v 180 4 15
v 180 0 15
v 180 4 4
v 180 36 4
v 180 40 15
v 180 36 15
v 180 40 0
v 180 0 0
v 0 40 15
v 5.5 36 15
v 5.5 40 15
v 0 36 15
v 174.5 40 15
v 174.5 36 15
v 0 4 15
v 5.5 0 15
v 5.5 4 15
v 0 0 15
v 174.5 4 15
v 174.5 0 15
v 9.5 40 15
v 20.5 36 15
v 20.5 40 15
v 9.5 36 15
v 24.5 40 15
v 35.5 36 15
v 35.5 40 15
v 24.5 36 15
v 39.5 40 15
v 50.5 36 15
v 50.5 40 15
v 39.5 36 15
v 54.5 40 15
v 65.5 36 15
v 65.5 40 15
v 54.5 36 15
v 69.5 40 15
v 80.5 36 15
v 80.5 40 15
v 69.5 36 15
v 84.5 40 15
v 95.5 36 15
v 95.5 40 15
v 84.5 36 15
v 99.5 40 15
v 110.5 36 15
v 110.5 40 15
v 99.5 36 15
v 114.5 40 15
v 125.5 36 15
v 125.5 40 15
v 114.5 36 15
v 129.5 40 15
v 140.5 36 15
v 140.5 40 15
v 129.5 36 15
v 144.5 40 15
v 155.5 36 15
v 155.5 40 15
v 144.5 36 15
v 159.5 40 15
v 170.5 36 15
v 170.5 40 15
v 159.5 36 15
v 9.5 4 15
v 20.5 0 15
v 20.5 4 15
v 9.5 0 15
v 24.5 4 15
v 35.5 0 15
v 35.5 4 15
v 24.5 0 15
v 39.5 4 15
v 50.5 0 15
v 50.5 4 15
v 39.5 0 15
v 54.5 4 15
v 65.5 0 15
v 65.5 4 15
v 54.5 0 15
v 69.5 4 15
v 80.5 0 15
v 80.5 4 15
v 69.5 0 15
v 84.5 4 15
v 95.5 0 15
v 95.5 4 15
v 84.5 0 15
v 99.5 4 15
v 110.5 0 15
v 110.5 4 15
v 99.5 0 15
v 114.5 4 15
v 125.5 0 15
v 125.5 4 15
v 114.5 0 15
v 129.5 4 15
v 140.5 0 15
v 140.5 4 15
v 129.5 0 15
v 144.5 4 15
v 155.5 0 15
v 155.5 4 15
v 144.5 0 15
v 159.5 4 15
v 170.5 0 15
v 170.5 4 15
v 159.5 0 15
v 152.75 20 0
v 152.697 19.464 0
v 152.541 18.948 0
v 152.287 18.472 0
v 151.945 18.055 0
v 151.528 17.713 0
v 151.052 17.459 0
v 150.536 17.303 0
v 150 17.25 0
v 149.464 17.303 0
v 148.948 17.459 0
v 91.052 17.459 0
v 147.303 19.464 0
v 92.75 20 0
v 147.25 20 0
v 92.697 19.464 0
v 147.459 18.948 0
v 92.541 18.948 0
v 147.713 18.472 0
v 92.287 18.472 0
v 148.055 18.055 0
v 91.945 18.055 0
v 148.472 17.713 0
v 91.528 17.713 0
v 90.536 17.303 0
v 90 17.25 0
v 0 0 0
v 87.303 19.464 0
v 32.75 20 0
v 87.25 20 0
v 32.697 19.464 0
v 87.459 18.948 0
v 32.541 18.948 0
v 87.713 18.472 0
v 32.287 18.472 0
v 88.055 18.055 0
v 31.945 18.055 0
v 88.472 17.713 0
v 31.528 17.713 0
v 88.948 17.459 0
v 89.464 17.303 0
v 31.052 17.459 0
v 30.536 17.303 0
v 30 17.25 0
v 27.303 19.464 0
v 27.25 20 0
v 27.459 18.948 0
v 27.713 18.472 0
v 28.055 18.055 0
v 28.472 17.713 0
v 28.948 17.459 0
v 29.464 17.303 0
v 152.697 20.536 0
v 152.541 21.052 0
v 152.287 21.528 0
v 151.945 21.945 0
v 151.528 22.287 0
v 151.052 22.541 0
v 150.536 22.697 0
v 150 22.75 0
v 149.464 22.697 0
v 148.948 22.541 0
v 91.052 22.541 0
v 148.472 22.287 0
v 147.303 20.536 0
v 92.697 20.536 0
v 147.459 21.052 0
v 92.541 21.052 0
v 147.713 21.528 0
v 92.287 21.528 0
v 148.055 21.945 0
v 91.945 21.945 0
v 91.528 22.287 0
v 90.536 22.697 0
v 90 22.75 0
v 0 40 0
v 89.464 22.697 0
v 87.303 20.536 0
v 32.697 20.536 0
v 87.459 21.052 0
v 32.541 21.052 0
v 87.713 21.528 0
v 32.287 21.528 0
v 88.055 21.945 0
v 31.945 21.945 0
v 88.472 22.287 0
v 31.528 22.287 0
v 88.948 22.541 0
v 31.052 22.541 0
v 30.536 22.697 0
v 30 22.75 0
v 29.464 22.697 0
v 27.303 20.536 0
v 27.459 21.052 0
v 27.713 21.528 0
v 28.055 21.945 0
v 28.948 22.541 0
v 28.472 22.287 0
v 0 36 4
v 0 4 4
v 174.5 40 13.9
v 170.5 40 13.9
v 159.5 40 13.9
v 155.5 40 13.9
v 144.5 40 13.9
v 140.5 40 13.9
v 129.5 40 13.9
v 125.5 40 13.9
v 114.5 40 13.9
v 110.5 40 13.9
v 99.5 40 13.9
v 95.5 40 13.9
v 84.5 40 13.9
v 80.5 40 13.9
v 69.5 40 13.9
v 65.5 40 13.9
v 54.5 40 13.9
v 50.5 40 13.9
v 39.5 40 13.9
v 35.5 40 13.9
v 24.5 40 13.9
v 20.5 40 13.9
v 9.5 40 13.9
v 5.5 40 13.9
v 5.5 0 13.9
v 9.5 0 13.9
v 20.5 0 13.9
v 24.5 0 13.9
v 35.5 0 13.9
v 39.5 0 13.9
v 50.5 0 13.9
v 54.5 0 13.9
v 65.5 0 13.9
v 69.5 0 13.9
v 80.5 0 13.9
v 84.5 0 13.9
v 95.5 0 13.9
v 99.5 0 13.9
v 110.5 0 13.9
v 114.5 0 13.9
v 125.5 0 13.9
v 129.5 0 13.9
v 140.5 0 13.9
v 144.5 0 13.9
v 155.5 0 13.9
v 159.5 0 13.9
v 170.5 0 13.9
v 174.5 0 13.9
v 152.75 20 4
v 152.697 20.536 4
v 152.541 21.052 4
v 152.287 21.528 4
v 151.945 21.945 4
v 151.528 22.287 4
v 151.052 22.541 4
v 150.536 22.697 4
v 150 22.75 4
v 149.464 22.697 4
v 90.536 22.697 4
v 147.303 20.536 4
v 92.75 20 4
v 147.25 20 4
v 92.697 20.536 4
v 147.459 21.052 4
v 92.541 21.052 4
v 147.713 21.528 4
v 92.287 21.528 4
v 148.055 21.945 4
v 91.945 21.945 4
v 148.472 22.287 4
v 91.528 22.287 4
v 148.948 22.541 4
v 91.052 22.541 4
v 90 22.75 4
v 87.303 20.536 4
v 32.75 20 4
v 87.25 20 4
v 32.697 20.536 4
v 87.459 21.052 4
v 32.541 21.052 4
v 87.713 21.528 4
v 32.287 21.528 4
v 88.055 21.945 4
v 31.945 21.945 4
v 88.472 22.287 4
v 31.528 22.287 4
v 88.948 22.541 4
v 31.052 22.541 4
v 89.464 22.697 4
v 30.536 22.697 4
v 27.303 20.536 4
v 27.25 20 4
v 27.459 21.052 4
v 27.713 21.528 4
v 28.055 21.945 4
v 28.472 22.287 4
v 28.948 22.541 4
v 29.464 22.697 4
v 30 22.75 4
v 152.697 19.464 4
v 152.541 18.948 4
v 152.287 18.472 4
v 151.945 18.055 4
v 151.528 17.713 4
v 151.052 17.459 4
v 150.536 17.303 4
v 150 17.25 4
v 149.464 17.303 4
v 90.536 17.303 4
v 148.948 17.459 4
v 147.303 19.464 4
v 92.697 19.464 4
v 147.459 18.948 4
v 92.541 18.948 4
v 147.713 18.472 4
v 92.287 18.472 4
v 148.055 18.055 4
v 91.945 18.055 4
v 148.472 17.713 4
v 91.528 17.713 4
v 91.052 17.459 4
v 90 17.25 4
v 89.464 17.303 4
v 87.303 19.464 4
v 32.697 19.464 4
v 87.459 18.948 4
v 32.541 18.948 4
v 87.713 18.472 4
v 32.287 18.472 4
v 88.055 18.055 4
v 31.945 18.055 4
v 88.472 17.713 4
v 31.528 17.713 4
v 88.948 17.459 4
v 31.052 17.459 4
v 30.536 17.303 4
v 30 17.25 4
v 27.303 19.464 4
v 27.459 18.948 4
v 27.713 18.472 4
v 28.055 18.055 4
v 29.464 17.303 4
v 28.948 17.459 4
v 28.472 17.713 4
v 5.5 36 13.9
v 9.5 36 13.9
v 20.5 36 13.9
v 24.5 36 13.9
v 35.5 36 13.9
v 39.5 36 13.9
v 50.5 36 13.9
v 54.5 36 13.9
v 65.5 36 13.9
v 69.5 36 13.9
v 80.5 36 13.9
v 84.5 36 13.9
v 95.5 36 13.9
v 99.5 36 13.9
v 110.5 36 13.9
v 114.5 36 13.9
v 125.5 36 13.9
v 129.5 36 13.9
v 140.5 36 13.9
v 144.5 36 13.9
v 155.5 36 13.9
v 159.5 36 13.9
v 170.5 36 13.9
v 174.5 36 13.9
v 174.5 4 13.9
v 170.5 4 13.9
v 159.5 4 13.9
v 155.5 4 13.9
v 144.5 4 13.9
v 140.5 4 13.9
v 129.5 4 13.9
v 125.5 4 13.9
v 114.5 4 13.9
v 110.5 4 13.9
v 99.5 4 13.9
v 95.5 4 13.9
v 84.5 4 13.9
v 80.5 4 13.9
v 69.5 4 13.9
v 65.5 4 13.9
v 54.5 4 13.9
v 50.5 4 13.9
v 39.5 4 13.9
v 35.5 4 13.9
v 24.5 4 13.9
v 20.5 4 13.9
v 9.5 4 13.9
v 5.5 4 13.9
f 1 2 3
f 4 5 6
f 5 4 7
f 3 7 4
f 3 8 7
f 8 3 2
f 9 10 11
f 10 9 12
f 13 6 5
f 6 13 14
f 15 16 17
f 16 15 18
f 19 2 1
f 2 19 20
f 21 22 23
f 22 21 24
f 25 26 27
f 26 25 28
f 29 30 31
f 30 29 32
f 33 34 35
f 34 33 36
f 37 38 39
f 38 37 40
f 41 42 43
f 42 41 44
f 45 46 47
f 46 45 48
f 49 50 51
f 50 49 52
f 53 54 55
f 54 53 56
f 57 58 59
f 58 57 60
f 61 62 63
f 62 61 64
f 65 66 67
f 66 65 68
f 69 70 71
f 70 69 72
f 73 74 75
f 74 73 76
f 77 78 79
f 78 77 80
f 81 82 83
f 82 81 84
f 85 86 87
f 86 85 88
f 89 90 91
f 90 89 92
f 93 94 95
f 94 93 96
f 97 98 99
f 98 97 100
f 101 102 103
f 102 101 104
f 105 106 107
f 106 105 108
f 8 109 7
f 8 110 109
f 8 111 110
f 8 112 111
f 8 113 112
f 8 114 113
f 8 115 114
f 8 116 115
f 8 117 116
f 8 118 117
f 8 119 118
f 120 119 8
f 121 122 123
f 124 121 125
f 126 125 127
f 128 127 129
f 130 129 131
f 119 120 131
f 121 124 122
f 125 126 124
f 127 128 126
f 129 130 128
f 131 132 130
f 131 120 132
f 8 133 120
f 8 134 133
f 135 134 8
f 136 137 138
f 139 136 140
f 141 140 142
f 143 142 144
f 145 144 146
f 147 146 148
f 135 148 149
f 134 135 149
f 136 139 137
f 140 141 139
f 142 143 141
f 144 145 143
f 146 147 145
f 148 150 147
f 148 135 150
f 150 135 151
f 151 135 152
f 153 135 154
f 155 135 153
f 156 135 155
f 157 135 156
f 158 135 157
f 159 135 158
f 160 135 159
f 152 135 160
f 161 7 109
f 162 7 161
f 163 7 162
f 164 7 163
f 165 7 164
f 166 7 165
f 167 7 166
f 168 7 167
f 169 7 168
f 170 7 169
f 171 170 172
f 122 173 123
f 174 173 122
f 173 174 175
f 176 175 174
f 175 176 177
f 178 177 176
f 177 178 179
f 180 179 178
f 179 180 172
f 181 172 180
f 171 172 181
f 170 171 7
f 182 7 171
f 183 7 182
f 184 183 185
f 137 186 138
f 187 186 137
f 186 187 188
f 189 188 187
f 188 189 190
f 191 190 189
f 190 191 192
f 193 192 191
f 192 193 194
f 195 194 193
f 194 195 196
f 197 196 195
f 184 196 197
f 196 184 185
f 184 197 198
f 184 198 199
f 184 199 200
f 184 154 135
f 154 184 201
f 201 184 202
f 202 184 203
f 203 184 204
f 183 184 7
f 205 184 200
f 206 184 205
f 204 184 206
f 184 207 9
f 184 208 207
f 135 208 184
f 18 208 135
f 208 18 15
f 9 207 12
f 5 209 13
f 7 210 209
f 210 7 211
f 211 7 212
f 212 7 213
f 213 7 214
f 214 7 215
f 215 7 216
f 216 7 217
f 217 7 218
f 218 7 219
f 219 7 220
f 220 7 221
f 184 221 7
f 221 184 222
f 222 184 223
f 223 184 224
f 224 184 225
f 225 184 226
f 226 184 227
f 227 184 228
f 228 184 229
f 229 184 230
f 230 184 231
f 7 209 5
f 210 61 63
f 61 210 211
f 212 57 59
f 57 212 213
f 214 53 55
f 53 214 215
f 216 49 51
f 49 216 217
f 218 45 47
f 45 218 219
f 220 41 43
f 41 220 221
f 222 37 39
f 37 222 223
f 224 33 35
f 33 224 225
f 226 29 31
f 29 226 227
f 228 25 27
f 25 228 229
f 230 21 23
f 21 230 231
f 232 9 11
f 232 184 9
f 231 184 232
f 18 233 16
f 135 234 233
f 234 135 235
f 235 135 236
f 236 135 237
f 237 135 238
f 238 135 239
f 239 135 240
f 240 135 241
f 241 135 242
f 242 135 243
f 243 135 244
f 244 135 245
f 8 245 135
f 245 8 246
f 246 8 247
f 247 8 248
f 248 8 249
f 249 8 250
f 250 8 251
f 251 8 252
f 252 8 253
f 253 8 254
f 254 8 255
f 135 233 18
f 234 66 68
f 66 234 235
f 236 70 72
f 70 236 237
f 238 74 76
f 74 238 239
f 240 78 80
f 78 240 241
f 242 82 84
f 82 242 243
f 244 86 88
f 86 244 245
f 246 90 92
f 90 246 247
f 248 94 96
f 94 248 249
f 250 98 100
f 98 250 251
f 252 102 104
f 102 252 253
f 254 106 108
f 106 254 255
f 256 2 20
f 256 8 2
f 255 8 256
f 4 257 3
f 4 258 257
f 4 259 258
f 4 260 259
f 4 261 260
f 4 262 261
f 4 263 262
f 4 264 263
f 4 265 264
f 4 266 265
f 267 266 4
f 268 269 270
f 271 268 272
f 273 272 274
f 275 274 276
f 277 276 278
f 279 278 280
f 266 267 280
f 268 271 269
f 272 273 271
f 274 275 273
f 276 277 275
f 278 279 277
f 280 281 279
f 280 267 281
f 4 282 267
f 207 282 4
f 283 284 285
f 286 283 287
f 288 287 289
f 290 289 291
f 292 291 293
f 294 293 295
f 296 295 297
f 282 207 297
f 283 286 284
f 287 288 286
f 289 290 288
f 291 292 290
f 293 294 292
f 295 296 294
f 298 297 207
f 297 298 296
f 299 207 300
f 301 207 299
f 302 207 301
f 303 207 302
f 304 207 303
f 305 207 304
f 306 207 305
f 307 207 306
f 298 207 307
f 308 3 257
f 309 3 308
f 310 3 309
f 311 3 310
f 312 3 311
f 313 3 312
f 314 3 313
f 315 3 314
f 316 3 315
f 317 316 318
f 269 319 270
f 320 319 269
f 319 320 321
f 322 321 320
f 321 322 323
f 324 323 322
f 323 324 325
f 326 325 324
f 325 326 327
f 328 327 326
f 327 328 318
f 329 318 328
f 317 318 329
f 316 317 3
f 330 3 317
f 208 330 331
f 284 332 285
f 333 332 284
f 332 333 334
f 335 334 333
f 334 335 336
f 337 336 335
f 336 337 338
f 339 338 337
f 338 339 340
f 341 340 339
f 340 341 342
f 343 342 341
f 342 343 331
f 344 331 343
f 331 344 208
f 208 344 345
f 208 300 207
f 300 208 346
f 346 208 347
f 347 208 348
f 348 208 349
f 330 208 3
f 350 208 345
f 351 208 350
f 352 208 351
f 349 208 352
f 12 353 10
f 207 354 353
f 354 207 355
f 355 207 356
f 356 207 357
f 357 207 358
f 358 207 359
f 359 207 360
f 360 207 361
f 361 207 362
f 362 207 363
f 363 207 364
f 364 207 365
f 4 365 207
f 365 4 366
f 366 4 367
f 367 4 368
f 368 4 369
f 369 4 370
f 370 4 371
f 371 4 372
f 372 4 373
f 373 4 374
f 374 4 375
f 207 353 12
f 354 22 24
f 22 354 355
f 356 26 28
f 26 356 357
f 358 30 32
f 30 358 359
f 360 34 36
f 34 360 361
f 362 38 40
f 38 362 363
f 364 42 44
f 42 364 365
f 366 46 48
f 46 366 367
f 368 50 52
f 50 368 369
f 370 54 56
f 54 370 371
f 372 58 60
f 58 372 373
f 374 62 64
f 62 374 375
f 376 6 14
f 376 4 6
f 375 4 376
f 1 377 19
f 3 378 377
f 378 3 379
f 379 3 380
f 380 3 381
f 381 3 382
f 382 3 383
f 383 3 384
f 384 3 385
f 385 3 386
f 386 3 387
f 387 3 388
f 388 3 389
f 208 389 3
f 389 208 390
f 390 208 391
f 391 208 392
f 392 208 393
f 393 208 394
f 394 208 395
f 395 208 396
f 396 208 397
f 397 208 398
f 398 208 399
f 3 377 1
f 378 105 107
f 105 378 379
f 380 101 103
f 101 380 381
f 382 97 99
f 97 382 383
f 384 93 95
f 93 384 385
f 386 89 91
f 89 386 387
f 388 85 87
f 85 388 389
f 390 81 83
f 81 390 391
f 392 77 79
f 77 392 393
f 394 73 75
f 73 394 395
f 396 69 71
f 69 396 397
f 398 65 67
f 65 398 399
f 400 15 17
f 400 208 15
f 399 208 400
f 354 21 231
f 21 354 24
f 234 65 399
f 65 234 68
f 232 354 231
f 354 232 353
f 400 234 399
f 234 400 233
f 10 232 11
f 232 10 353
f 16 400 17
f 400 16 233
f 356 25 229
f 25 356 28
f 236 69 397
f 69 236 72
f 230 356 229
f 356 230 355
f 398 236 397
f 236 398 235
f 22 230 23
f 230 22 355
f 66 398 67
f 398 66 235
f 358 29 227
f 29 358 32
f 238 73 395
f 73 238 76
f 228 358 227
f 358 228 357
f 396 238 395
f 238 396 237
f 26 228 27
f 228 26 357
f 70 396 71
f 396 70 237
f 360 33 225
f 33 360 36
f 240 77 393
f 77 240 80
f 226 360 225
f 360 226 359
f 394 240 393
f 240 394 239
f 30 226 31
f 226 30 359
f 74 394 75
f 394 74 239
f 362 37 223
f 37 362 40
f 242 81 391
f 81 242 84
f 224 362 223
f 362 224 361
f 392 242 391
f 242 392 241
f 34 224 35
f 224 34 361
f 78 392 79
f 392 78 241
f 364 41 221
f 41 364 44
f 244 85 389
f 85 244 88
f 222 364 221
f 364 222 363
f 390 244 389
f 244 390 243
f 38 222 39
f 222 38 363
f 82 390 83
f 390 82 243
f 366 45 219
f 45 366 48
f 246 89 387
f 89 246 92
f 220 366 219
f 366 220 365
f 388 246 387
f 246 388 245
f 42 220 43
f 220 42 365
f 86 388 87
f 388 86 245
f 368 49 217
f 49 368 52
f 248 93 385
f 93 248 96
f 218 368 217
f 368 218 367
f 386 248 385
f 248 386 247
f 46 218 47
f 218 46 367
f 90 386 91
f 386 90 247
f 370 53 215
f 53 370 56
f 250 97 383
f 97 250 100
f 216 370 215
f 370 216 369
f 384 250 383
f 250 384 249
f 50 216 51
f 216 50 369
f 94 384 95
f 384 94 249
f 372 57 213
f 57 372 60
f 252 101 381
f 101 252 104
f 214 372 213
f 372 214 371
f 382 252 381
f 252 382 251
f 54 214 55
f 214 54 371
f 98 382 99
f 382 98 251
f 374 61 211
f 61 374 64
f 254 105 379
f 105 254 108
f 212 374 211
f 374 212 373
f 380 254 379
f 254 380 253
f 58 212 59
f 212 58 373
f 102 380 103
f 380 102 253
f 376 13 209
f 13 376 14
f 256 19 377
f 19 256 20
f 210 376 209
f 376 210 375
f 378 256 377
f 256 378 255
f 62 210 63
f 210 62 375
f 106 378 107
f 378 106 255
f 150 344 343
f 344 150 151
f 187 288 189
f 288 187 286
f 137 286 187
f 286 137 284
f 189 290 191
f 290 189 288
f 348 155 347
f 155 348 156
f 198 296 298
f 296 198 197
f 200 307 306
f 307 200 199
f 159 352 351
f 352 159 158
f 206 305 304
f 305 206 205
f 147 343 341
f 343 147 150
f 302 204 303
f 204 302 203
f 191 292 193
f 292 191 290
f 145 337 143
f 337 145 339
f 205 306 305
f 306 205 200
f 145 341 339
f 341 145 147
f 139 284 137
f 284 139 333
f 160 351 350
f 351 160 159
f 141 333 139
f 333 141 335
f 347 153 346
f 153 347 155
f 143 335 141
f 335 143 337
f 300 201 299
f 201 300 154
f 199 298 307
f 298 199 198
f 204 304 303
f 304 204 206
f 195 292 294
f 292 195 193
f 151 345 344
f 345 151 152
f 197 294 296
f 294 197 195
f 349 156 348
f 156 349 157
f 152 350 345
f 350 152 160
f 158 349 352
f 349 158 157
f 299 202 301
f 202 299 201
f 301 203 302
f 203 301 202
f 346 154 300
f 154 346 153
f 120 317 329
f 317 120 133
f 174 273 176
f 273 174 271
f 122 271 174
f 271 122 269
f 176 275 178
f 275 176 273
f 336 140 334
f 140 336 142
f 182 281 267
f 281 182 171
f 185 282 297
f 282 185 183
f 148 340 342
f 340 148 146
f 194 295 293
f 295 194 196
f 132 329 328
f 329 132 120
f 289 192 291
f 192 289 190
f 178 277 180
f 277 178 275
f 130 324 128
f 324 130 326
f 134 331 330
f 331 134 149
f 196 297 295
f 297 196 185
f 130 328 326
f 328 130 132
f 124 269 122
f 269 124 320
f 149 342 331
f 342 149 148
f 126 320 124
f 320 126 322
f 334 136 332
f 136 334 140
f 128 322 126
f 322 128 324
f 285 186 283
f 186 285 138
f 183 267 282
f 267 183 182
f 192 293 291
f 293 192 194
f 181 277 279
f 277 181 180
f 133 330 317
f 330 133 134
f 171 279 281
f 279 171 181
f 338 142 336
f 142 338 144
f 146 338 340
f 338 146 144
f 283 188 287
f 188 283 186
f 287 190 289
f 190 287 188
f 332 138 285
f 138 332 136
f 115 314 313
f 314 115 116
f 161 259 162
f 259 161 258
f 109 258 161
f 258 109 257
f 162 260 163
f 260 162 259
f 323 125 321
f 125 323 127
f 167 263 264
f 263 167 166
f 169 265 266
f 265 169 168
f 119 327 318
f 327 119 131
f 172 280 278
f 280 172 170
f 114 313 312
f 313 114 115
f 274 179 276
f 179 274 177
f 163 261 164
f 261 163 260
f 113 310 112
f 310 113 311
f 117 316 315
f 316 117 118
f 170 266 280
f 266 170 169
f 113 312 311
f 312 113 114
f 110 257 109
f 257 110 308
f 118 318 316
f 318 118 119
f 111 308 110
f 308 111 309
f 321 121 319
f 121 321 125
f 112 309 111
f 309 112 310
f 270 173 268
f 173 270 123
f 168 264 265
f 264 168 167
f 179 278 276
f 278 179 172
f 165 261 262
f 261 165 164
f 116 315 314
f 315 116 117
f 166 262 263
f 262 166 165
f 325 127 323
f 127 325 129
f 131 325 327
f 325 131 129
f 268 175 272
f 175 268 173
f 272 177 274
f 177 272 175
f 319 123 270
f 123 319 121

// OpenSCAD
$fn = 32;

// ----------------------------------------------------------------------
// Cable duct: 180 x 40 x 15 mm, 12 fingers
// ----------------------------------------------------------------------

// --- parameters (mm) ---
duct_len = 180;           // duct length, X
duct_w = 40;              // duct width, Y
duct_h = 15;              // duct height, Z
wall_t = 4;               // side wall thickness
floor_t = 4;              // floor thickness
slot_w = 4;               // finger slot width
slot_h = 9.9;             // finger slot height
fingers = 12;             // number of finger slots per side
pitch = 15;               // finger pitch
hole_d = 5.5;             // floor mounting hole
hole_n = 3;               // mounting holes in the floor

module shell() {
  difference() {
    cube([duct_len, duct_w, duct_h]);
    /* open top channel */
    translate([-wall_t - 1, wall_t, floor_t])
      cube([duct_len + 2 * wall_t + 2, duct_w - 2 * wall_t, duct_h + 1]);
  }
}

difference() {
  union() {
    shell();
  }
  /* finger slots cut through both side walls */
  for (i = [0 : fingers - 1]) translate([pitch / 2 + i * pitch - slot_w / 2, -1, floor_t + slot_h]) cube([slot_w, duct_w + 2, duct_h]);
  for (i = [0 : hole_n - 1]) translate([(duct_len / hole_n) * (i + 0.5), duct_w / 2, -1]) cylinder(h = floor_t + 2, d = hole_d);
}
